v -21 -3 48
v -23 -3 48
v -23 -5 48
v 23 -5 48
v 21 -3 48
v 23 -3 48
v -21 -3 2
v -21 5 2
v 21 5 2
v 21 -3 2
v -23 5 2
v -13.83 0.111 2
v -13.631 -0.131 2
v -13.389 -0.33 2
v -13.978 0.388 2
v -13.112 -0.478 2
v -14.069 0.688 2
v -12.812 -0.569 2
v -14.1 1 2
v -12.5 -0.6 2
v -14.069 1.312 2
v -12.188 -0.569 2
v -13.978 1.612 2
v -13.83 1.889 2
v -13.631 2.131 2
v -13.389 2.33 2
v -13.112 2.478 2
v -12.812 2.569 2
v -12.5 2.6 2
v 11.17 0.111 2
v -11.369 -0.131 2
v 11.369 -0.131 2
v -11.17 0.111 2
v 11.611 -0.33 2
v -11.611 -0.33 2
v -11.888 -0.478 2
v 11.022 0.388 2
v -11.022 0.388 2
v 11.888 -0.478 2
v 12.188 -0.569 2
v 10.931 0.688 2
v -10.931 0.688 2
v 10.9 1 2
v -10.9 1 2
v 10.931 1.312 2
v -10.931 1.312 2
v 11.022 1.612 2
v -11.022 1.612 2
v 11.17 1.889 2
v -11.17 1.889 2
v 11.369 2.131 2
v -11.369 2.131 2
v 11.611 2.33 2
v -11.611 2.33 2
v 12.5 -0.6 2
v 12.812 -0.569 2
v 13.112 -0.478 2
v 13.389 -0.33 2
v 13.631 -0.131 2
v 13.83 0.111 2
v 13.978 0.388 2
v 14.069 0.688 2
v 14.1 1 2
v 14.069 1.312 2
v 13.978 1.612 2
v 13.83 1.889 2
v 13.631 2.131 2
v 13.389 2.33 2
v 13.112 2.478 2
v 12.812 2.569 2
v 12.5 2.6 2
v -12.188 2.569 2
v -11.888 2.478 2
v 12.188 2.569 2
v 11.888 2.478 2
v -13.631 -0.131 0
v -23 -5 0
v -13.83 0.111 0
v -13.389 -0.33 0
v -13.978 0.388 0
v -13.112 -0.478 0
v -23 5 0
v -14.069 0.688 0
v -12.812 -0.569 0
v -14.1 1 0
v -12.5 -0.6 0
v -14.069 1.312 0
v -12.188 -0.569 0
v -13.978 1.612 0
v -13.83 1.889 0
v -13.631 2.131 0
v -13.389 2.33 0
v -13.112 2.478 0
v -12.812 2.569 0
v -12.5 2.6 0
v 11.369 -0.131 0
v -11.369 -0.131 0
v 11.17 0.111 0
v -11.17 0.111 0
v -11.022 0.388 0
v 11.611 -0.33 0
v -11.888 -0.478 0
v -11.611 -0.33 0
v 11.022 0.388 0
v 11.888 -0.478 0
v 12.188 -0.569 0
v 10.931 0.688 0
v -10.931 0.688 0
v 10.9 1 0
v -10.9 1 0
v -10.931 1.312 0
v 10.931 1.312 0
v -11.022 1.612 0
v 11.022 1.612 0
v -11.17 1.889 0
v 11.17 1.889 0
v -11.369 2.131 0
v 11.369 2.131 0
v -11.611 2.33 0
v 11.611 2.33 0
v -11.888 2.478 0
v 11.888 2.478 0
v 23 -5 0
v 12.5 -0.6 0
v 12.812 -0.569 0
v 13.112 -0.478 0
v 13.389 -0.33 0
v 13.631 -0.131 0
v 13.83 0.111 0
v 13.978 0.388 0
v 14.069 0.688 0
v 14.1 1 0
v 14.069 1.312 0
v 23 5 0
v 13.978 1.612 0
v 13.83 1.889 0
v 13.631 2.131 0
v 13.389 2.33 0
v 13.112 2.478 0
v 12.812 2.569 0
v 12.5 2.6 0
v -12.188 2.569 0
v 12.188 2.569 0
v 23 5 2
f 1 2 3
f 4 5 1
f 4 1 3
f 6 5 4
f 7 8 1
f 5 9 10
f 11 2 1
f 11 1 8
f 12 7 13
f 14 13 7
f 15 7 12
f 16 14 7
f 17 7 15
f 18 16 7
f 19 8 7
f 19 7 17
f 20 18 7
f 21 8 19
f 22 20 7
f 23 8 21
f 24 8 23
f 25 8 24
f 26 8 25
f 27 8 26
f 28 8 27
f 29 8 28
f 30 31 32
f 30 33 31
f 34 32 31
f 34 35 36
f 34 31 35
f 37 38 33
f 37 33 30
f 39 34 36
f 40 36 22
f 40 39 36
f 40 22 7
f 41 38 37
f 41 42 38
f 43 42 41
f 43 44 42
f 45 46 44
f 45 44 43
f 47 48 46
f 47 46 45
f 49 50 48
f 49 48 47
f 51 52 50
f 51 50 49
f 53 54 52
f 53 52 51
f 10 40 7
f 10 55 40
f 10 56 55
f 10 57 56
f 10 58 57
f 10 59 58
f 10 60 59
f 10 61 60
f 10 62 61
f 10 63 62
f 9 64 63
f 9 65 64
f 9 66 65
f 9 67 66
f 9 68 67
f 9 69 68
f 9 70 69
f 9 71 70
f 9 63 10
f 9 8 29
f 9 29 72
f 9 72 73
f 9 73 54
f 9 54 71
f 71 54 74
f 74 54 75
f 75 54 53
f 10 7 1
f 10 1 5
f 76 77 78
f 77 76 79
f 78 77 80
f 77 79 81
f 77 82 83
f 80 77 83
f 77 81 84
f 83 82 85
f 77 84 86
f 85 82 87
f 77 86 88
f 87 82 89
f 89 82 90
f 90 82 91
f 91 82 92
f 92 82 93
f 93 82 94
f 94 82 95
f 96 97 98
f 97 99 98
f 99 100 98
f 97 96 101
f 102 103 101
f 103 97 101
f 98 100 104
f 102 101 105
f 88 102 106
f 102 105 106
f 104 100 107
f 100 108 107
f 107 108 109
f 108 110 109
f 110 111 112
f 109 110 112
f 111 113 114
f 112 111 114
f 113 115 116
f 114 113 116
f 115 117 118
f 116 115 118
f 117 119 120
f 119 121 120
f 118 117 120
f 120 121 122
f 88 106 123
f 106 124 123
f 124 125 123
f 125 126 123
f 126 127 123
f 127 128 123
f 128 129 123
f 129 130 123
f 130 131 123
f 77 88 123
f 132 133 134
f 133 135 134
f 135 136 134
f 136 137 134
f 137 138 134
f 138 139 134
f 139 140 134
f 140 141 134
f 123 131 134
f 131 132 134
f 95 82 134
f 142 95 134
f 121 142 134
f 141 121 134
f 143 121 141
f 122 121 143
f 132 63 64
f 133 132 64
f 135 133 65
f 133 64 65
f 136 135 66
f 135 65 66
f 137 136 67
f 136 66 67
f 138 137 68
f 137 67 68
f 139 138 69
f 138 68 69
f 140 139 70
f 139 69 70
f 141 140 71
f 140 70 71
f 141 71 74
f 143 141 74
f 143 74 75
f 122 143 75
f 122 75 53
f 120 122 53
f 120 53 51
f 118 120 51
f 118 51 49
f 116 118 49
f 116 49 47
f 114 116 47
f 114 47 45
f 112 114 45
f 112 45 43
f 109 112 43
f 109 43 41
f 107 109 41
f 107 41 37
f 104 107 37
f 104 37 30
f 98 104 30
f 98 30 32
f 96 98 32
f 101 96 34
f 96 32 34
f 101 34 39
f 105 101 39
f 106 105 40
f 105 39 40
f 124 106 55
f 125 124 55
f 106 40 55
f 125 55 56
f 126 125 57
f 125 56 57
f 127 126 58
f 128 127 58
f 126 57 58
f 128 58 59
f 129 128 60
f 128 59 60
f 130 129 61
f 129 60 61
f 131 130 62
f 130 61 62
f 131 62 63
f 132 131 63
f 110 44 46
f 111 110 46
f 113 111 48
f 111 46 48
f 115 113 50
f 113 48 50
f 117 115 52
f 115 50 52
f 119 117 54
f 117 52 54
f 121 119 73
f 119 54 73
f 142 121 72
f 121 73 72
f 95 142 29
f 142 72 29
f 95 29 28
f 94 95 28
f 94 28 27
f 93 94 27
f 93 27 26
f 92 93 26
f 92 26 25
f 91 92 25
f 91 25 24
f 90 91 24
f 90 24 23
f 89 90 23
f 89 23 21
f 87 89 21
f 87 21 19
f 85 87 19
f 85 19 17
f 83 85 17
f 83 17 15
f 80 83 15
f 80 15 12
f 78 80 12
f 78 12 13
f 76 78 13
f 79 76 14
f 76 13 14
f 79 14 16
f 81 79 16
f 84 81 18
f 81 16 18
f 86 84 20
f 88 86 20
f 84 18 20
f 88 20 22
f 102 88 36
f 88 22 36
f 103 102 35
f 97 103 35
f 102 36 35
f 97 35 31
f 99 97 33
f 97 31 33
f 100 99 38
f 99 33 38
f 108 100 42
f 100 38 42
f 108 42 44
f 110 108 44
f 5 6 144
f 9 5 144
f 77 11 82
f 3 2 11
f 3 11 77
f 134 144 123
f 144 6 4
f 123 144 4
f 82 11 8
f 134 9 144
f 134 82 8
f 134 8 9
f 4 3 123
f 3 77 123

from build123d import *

# Parameters (mm, degrees)
SKETCH_W     = 46
SKETCH_H     = 10
PAD_DEPTH    = 2
SKETCH001_W  = 46
SKETCH001_H  = 2
PAD001_DEPTH = 46
PAD002_DEPTH = 2
SKETCH003_R  = 1.6
POCKET_DEPTH = 2.001


with BuildPart() as part:
    # Sketch → Pad (new body)
    with BuildSketch(Plane.XY):
        Rectangle(SKETCH_W, SKETCH_H)
    extrude(amount=PAD_DEPTH)

    # Sketch001 (on Face6 of Pad) → Pad001 (join)
    with BuildSketch(Plane.XY.offset(2)):
        with Locations((0, -4)):
            Rectangle(SKETCH001_W, SKETCH001_H)
    extrude(amount=PAD001_DEPTH)

    # Sketch002 (on Face8 of Pad001) → Pad002 (join)
    with BuildSketch(Plane.YZ.offset(23)):
        Polygon((-3, 48), (5, 2), (-3, 2), align=None)
    pad002 = extrude(amount=-PAD002_DEPTH)

    # Mirrored: Pad002 across YZ
    add(pad002.mirror(Plane.YZ))

    # Sketch003 (on Face5 of Mirrored) → Pocket (cut, through all)
    with BuildSketch(Plane.XY.offset(2)):
        with Locations((-12.5, 1)):
            Circle(SKETCH003_R)
        with Locations((12.5, 1)):
            Circle(SKETCH003_R)
    extrude(amount=-POCKET_DEPTH, mode=Mode.SUBTRACT)


solid = part.part
